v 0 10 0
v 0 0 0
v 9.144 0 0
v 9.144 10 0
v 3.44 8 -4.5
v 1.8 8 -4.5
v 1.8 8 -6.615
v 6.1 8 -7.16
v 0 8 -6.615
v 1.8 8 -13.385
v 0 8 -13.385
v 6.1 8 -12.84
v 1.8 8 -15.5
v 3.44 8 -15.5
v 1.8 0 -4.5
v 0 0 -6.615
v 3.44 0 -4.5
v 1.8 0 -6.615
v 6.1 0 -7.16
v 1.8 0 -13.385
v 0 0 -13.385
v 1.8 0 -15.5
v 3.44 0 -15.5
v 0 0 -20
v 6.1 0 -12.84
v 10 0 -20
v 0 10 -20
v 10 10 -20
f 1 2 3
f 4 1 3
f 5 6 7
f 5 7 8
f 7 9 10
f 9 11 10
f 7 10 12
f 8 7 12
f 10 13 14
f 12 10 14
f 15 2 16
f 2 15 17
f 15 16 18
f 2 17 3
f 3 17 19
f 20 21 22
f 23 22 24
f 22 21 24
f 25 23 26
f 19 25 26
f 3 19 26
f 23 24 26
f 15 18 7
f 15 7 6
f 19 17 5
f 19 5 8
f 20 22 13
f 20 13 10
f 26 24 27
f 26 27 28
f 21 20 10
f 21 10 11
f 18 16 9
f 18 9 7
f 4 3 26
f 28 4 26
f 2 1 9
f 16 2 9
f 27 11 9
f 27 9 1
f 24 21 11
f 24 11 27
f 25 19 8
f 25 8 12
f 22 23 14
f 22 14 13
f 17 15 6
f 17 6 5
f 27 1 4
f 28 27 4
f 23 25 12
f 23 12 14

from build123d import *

# Parameters (mm, degrees)
SKETCH4_W           = 10
SKETCH4_H           = 20
BOSS_EXTRUDE1_DEPTH = 10
CUT_EXTRUDE1_DEPTH  = 8
CUT_EXTRUDE2_DEPTH  = 25.494897428


with BuildPart() as part:
    # Sketch4 → Boss-Extrude1 (new body)
    with BuildSketch(Plane(origin=(0, 0, 0), x_dir=(1, 0, 0), z_dir=(0, 1, 0))):
        with Locations((5, 10)):
            Rectangle(SKETCH4_W, SKETCH4_H)
    extrude(amount=BOSS_EXTRUDE1_DEPTH)

    # Sketch2 → Cut-Extrude1 (cut)
    with BuildSketch(Plane(origin=(0, 0, 0), x_dir=(-1, 0, 0), z_dir=(0, -1, 0))):
        Polygon((0, 6.615), (-1.8, 6.615), (-1.8, 4.5), (-3.44, 4.5), (-6.1, 7.16), (-6.1, 12.84), (-3.44, 15.5), (-1.8, 15.5), (-1.8, 13.385), (0, 13.385), align=None)
    extrude(amount=-CUT_EXTRUDE1_DEPTH, mode=Mode.SUBTRACT)

    # Sketch6 → Cut-Extrude2 (cut, through all)
    with BuildSketch(Plane.XZ):
        Polygon((10, 0), (9.144267043, 0), (10, -20), align=None)
    extrude(amount=-CUT_EXTRUDE2_DEPTH, mode=Mode.SUBTRACT)


solid = part.part
